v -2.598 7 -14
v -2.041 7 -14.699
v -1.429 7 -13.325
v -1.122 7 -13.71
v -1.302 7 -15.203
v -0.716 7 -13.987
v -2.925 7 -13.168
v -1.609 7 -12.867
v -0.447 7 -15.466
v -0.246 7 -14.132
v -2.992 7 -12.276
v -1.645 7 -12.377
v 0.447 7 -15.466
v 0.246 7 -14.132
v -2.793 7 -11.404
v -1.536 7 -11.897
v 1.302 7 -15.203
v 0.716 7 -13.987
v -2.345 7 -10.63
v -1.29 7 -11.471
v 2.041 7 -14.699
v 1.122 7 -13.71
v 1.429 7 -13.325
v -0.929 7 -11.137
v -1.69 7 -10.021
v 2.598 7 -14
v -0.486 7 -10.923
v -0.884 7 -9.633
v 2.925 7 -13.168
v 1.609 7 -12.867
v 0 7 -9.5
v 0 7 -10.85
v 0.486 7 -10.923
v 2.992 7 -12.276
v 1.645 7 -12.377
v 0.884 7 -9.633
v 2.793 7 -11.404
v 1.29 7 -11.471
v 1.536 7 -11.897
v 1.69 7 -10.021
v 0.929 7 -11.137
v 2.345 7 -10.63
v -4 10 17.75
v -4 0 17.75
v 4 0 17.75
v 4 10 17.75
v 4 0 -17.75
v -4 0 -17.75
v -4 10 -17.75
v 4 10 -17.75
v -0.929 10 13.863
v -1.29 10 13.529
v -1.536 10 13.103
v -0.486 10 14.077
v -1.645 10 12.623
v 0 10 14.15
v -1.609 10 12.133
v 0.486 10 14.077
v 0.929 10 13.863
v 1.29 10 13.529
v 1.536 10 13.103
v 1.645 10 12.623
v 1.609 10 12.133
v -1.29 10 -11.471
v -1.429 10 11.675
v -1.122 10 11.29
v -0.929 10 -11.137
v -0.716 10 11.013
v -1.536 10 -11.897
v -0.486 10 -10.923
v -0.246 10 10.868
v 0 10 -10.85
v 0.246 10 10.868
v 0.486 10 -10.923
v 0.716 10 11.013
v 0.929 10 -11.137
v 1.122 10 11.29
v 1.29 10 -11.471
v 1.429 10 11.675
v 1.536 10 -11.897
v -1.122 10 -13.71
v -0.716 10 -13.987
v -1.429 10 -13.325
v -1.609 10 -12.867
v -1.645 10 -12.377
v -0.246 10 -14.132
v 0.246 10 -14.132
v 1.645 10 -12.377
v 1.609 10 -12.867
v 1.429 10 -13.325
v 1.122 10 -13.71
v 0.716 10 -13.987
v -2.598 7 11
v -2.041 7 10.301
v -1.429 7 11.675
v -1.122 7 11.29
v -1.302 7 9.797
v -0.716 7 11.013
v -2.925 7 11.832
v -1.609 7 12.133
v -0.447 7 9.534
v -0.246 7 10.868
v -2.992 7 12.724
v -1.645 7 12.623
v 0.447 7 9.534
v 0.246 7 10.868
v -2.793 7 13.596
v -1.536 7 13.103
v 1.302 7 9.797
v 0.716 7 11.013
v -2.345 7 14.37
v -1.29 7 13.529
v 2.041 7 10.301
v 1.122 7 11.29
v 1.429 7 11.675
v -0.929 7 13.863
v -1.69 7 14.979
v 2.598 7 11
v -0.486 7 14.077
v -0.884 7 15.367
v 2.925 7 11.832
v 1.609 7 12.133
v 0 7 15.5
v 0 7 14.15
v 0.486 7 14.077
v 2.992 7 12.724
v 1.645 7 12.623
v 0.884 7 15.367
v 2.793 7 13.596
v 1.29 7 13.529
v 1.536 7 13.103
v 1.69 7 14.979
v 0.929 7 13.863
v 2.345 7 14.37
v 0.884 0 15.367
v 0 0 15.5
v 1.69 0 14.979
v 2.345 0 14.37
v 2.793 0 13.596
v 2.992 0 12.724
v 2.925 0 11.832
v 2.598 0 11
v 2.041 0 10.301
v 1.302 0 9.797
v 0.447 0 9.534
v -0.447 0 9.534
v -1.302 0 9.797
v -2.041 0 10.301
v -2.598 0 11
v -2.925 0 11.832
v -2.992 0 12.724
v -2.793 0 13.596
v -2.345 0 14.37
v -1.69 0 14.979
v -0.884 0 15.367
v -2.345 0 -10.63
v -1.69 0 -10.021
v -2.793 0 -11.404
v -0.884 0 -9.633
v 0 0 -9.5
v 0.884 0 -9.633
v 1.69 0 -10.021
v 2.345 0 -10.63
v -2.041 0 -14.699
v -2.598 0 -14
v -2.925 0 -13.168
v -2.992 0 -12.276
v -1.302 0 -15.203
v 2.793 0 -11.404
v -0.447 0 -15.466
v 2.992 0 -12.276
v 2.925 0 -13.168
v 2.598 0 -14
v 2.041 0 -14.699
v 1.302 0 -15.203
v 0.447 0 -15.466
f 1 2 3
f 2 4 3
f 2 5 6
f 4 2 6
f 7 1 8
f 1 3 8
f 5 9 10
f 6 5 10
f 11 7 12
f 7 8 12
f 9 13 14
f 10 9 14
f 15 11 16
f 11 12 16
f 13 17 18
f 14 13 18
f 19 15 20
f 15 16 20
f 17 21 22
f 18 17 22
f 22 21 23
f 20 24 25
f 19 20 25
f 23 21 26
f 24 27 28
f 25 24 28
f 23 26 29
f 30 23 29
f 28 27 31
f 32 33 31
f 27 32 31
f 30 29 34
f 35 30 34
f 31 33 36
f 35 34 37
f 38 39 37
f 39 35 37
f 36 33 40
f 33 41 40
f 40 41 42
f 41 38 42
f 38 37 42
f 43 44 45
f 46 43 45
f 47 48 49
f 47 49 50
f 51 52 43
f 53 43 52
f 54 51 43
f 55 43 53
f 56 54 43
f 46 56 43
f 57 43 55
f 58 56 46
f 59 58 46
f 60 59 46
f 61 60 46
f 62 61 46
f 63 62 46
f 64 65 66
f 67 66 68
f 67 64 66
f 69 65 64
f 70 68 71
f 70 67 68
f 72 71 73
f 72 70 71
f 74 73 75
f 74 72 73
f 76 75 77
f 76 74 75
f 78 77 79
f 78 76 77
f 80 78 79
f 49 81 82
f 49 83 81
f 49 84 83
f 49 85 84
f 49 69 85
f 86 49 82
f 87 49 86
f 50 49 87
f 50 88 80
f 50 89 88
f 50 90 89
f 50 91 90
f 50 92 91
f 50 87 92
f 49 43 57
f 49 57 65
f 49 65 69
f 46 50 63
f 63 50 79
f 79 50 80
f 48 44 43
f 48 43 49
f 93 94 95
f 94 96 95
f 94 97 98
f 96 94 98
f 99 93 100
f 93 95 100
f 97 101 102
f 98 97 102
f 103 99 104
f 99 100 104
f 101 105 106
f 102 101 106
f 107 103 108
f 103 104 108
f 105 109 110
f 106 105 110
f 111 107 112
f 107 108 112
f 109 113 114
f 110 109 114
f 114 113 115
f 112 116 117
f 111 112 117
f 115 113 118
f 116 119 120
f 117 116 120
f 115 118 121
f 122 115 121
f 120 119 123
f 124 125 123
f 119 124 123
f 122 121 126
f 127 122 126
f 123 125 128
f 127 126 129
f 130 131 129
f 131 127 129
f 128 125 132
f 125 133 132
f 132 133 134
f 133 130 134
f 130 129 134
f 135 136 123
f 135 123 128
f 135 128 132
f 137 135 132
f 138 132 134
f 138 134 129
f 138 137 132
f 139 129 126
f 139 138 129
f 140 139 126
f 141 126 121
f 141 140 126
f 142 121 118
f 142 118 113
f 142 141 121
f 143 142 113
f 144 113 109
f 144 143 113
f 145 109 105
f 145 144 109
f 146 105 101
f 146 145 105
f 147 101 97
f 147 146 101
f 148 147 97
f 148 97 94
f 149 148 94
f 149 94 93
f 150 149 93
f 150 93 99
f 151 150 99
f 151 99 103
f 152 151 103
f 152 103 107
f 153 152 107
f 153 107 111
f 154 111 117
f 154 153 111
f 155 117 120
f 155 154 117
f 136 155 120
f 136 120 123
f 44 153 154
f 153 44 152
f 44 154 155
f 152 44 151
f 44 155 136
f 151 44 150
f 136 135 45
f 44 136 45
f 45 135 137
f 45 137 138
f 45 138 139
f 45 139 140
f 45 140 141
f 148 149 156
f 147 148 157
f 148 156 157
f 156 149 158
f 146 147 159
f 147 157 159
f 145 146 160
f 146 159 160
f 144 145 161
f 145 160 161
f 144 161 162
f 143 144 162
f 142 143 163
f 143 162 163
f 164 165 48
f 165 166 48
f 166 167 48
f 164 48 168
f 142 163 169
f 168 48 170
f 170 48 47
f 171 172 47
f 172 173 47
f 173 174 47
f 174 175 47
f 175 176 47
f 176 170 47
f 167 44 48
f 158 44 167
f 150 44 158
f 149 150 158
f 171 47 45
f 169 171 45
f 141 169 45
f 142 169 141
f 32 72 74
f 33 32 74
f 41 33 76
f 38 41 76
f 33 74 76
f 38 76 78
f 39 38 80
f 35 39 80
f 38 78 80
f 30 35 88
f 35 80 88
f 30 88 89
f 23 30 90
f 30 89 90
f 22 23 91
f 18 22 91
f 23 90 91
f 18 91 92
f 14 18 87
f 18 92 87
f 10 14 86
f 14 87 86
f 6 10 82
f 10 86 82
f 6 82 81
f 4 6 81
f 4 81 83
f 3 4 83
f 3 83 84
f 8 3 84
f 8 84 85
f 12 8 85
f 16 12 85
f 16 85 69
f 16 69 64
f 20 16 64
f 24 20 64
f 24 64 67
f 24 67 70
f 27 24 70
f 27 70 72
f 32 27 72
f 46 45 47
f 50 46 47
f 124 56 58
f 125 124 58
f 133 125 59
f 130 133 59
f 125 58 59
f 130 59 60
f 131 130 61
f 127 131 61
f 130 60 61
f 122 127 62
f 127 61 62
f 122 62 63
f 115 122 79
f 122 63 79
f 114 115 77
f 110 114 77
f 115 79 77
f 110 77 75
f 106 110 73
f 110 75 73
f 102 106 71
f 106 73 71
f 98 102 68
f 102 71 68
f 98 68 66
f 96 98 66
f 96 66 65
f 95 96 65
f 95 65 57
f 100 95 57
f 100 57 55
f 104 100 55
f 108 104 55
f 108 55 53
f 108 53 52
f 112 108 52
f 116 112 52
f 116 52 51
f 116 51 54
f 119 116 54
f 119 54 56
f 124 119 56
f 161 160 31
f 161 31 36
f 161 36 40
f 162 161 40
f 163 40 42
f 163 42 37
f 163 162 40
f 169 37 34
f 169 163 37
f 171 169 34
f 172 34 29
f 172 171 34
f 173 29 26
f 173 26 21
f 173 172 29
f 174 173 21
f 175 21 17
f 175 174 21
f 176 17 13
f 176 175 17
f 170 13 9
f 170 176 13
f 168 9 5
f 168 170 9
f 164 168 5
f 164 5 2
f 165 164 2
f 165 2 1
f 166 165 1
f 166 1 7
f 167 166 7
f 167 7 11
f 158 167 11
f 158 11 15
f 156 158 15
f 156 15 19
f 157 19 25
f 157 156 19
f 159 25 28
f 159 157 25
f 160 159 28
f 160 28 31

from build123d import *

# Parameters (mm, degrees)
SKETCH_1_W          = 8
SKETCH_1_H          = 35.5
EXTRUDE_1_DEPTH     = 10
CUT_EXTRUDE_1_REACH = 22.762
SKETCH_2_R          = 1.65
SKETCH_3_R          = 3
CUT_EXTRUDE_2_DEPTH = 7


with BuildPart() as part:
    # 草图1 → 凸台-拉伸1 (new body)
    with BuildSketch(Plane(origin=(0, 0, 0), x_dir=(1, 0, 0), z_dir=(0, 1, 0))):
        Rectangle(SKETCH_1_W, SKETCH_1_H)
    extrude(amount=EXTRUDE_1_DEPTH)

    # 草图2 → 切除-拉伸1 (cut, up to next)
    with BuildSketch(Plane(origin=(0, 10, 0), x_dir=(1, 0, 0), z_dir=(0, 1, 0)), mode=Mode.PRIVATE) as cut_extrude_1_sk1:
        with Locations(Location((0, 12.5, 0), (0, 0, 270))):
            Circle(SKETCH_2_R)
    cut_extrude_1_tool1 = extrude(cut_extrude_1_sk1.sketch, amount=-CUT_EXTRUDE_1_REACH, mode=Mode.PRIVATE) & part.part
    # 草图2 → 切除-拉伸1 (cut, up to next)
    with BuildSketch(Plane(origin=(0, 10, 0), x_dir=(1, 0, 0), z_dir=(0, 1, 0)), mode=Mode.PRIVATE) as cut_extrude_1_sk2:
        with Locations(Location((0, -12.5, 0), (0, 0, 270))):
            Circle(SKETCH_2_R)
    cut_extrude_1_tool2 = extrude(cut_extrude_1_sk2.sketch, amount=-CUT_EXTRUDE_1_REACH, mode=Mode.PRIVATE) & part.part
    add(cut_extrude_1_tool1.solids().sort_by_distance((0, 10, -12.5))[0], mode=Mode.SUBTRACT)
    add(cut_extrude_1_tool2.solids().sort_by_distance((0, 10, 12.5))[0], mode=Mode.SUBTRACT)

    # 草图3 → 切除-拉伸2 (cut)
    with BuildSketch(Plane(origin=(0, 0, 0), x_dir=(1, 0, 0), z_dir=(0, 1, 0))):
        with Locations(Location((0, 12.5, 0), (0, 0, 270))):
            Circle(SKETCH_3_R)
        with Locations(Location((0, -12.5, 0), (0, 0, 270))):
            Circle(SKETCH_3_R)
    extrude(amount=CUT_EXTRUDE_2_DEPTH, mode=Mode.SUBTRACT)


solid = part.part
